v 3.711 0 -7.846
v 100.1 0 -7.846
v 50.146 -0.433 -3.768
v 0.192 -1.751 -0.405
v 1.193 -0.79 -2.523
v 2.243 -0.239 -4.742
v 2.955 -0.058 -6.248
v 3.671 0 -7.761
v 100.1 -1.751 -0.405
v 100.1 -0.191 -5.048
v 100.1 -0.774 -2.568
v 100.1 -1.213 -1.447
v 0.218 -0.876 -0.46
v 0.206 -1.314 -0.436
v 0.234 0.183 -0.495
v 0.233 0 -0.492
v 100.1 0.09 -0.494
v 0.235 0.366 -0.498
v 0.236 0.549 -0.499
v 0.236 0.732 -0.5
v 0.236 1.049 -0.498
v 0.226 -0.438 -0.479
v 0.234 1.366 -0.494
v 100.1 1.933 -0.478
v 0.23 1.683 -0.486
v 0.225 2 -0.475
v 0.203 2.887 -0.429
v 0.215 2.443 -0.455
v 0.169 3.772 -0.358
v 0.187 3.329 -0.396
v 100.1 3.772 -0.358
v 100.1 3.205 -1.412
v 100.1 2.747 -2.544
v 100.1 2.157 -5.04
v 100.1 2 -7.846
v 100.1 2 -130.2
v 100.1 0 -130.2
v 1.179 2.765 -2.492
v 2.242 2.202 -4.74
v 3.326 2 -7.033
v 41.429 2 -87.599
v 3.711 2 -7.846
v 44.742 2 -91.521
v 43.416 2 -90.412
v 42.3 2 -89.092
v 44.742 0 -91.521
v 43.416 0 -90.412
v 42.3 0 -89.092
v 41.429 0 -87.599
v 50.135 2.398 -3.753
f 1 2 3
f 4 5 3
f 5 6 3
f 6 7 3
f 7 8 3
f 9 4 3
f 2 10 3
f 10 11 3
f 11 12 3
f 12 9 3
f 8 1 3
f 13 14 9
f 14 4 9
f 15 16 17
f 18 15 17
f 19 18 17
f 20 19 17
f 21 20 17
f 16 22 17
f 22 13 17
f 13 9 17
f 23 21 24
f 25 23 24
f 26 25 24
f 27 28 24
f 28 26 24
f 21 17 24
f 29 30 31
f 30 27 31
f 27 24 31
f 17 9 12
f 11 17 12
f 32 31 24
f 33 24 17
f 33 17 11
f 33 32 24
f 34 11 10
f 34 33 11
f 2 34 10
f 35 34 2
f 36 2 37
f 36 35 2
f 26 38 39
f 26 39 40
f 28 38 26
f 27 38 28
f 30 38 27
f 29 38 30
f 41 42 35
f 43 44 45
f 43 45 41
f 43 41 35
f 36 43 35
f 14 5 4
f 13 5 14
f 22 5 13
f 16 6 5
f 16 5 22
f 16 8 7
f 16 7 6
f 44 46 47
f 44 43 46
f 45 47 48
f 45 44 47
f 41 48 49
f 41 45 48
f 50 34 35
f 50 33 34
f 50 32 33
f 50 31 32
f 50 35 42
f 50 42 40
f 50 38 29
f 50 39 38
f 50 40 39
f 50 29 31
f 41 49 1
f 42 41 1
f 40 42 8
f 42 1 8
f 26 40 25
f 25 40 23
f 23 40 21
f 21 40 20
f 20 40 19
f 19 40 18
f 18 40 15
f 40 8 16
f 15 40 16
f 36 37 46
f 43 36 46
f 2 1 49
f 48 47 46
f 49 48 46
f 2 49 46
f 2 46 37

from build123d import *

# Parameters (mm, degrees)
RESSALTO_EXTRUS_O1_DEPTH      = 2
FILETE1_R                     = 10
RESSALTO_EXTRUS_O2_DEPTH      = 2
RESSALTO_EXTRUS_O2_DEPTH_BACK = 4
CORTE_EXTRUS_O1_DEPTH         = 106
ESBO_O5_R                     = 32.5
CORTE_EXTRUS_O2_DEPTH         = 106


with BuildPart() as part:
    # Esboço1 → Ressalto-extrusão1 (new body)
    with BuildSketch(Plane(origin=(0, 0, 0), x_dir=(1, 0, 0), z_dir=(0, 1, 0))):
        Polygon((0, 0), (100.1, 0), (100.1, 130.2), (42.5645027, 90), align=None)
    extrude(amount=RESSALTO_EXTRUS_O1_DEPTH)

    # Filete1
    filete1_edges = [part.edges().sort_by_distance(p)[0] for p in [
        (42.5645027, 1, -90),
    ]]
    fillet(filete1_edges, radius=FILETE1_R)

    # Esboço2 → Ressalto-extrusão2 (add, two sides: drawn at the far end of the back side and taken through both)
    with BuildSketch(Plane(origin=(0, 0, 0), x_dir=(-1, 0, 0), z_dir=(0, -1, 0)).offset(-RESSALTO_EXTRUS_O2_DEPTH_BACK)):
        Polygon((-100.1, 0), (-100.1, 7.845993173), (-3.710675529, 7.845993173), (0, 0), align=None)
    extrude(amount=RESSALTO_EXTRUS_O2_DEPTH + RESSALTO_EXTRUS_O2_DEPTH_BACK)

    # Esboço4 → Corte-extrusão1 (cut)
    with BuildSketch(Plane(origin=(100.1, 0, 0), x_dir=(0, 0, -1), z_dir=(1, 0, 0))):
        with BuildLine():
            Line((0, 4), (7.845993173, 4))
            Line((7.845993173, 4), (7.845993173, 2))
            add(Edge.make_bspline(
                [(7.845993173, 2), (3.140345255, 1.903943557), (0, 4)],
                knots=[0, 0, 0, 1, 1, 1], degree=2))
        make_face()
        with BuildLine():
            Line((7.845993173, 0), (7.845993173, -2))
            Line((7.845993173, -2), (0, -2))
            add(Edge.make_bspline(
                [(7.845993173, 0), (3.106908611, 0.009053077), (0, -2)],
                knots=[0, 0, 0, 1, 1, 1], degree=2))
        make_face()
    extrude(amount=-CORTE_EXTRUS_O1_DEPTH, mode=Mode.SUBTRACT)

    # Esboço5 → Corte-extrusão2 (cut)
    with BuildSketch(Plane(origin=(100.1, 0, 0), x_dir=(0, 0, -1), z_dir=(1, 0, 0))):
        with Locations((-32, 0.73240575)):
            Circle(ESBO_O5_R)
    extrude(amount=-CORTE_EXTRUS_O2_DEPTH, mode=Mode.SUBTRACT)


solid = part.part
